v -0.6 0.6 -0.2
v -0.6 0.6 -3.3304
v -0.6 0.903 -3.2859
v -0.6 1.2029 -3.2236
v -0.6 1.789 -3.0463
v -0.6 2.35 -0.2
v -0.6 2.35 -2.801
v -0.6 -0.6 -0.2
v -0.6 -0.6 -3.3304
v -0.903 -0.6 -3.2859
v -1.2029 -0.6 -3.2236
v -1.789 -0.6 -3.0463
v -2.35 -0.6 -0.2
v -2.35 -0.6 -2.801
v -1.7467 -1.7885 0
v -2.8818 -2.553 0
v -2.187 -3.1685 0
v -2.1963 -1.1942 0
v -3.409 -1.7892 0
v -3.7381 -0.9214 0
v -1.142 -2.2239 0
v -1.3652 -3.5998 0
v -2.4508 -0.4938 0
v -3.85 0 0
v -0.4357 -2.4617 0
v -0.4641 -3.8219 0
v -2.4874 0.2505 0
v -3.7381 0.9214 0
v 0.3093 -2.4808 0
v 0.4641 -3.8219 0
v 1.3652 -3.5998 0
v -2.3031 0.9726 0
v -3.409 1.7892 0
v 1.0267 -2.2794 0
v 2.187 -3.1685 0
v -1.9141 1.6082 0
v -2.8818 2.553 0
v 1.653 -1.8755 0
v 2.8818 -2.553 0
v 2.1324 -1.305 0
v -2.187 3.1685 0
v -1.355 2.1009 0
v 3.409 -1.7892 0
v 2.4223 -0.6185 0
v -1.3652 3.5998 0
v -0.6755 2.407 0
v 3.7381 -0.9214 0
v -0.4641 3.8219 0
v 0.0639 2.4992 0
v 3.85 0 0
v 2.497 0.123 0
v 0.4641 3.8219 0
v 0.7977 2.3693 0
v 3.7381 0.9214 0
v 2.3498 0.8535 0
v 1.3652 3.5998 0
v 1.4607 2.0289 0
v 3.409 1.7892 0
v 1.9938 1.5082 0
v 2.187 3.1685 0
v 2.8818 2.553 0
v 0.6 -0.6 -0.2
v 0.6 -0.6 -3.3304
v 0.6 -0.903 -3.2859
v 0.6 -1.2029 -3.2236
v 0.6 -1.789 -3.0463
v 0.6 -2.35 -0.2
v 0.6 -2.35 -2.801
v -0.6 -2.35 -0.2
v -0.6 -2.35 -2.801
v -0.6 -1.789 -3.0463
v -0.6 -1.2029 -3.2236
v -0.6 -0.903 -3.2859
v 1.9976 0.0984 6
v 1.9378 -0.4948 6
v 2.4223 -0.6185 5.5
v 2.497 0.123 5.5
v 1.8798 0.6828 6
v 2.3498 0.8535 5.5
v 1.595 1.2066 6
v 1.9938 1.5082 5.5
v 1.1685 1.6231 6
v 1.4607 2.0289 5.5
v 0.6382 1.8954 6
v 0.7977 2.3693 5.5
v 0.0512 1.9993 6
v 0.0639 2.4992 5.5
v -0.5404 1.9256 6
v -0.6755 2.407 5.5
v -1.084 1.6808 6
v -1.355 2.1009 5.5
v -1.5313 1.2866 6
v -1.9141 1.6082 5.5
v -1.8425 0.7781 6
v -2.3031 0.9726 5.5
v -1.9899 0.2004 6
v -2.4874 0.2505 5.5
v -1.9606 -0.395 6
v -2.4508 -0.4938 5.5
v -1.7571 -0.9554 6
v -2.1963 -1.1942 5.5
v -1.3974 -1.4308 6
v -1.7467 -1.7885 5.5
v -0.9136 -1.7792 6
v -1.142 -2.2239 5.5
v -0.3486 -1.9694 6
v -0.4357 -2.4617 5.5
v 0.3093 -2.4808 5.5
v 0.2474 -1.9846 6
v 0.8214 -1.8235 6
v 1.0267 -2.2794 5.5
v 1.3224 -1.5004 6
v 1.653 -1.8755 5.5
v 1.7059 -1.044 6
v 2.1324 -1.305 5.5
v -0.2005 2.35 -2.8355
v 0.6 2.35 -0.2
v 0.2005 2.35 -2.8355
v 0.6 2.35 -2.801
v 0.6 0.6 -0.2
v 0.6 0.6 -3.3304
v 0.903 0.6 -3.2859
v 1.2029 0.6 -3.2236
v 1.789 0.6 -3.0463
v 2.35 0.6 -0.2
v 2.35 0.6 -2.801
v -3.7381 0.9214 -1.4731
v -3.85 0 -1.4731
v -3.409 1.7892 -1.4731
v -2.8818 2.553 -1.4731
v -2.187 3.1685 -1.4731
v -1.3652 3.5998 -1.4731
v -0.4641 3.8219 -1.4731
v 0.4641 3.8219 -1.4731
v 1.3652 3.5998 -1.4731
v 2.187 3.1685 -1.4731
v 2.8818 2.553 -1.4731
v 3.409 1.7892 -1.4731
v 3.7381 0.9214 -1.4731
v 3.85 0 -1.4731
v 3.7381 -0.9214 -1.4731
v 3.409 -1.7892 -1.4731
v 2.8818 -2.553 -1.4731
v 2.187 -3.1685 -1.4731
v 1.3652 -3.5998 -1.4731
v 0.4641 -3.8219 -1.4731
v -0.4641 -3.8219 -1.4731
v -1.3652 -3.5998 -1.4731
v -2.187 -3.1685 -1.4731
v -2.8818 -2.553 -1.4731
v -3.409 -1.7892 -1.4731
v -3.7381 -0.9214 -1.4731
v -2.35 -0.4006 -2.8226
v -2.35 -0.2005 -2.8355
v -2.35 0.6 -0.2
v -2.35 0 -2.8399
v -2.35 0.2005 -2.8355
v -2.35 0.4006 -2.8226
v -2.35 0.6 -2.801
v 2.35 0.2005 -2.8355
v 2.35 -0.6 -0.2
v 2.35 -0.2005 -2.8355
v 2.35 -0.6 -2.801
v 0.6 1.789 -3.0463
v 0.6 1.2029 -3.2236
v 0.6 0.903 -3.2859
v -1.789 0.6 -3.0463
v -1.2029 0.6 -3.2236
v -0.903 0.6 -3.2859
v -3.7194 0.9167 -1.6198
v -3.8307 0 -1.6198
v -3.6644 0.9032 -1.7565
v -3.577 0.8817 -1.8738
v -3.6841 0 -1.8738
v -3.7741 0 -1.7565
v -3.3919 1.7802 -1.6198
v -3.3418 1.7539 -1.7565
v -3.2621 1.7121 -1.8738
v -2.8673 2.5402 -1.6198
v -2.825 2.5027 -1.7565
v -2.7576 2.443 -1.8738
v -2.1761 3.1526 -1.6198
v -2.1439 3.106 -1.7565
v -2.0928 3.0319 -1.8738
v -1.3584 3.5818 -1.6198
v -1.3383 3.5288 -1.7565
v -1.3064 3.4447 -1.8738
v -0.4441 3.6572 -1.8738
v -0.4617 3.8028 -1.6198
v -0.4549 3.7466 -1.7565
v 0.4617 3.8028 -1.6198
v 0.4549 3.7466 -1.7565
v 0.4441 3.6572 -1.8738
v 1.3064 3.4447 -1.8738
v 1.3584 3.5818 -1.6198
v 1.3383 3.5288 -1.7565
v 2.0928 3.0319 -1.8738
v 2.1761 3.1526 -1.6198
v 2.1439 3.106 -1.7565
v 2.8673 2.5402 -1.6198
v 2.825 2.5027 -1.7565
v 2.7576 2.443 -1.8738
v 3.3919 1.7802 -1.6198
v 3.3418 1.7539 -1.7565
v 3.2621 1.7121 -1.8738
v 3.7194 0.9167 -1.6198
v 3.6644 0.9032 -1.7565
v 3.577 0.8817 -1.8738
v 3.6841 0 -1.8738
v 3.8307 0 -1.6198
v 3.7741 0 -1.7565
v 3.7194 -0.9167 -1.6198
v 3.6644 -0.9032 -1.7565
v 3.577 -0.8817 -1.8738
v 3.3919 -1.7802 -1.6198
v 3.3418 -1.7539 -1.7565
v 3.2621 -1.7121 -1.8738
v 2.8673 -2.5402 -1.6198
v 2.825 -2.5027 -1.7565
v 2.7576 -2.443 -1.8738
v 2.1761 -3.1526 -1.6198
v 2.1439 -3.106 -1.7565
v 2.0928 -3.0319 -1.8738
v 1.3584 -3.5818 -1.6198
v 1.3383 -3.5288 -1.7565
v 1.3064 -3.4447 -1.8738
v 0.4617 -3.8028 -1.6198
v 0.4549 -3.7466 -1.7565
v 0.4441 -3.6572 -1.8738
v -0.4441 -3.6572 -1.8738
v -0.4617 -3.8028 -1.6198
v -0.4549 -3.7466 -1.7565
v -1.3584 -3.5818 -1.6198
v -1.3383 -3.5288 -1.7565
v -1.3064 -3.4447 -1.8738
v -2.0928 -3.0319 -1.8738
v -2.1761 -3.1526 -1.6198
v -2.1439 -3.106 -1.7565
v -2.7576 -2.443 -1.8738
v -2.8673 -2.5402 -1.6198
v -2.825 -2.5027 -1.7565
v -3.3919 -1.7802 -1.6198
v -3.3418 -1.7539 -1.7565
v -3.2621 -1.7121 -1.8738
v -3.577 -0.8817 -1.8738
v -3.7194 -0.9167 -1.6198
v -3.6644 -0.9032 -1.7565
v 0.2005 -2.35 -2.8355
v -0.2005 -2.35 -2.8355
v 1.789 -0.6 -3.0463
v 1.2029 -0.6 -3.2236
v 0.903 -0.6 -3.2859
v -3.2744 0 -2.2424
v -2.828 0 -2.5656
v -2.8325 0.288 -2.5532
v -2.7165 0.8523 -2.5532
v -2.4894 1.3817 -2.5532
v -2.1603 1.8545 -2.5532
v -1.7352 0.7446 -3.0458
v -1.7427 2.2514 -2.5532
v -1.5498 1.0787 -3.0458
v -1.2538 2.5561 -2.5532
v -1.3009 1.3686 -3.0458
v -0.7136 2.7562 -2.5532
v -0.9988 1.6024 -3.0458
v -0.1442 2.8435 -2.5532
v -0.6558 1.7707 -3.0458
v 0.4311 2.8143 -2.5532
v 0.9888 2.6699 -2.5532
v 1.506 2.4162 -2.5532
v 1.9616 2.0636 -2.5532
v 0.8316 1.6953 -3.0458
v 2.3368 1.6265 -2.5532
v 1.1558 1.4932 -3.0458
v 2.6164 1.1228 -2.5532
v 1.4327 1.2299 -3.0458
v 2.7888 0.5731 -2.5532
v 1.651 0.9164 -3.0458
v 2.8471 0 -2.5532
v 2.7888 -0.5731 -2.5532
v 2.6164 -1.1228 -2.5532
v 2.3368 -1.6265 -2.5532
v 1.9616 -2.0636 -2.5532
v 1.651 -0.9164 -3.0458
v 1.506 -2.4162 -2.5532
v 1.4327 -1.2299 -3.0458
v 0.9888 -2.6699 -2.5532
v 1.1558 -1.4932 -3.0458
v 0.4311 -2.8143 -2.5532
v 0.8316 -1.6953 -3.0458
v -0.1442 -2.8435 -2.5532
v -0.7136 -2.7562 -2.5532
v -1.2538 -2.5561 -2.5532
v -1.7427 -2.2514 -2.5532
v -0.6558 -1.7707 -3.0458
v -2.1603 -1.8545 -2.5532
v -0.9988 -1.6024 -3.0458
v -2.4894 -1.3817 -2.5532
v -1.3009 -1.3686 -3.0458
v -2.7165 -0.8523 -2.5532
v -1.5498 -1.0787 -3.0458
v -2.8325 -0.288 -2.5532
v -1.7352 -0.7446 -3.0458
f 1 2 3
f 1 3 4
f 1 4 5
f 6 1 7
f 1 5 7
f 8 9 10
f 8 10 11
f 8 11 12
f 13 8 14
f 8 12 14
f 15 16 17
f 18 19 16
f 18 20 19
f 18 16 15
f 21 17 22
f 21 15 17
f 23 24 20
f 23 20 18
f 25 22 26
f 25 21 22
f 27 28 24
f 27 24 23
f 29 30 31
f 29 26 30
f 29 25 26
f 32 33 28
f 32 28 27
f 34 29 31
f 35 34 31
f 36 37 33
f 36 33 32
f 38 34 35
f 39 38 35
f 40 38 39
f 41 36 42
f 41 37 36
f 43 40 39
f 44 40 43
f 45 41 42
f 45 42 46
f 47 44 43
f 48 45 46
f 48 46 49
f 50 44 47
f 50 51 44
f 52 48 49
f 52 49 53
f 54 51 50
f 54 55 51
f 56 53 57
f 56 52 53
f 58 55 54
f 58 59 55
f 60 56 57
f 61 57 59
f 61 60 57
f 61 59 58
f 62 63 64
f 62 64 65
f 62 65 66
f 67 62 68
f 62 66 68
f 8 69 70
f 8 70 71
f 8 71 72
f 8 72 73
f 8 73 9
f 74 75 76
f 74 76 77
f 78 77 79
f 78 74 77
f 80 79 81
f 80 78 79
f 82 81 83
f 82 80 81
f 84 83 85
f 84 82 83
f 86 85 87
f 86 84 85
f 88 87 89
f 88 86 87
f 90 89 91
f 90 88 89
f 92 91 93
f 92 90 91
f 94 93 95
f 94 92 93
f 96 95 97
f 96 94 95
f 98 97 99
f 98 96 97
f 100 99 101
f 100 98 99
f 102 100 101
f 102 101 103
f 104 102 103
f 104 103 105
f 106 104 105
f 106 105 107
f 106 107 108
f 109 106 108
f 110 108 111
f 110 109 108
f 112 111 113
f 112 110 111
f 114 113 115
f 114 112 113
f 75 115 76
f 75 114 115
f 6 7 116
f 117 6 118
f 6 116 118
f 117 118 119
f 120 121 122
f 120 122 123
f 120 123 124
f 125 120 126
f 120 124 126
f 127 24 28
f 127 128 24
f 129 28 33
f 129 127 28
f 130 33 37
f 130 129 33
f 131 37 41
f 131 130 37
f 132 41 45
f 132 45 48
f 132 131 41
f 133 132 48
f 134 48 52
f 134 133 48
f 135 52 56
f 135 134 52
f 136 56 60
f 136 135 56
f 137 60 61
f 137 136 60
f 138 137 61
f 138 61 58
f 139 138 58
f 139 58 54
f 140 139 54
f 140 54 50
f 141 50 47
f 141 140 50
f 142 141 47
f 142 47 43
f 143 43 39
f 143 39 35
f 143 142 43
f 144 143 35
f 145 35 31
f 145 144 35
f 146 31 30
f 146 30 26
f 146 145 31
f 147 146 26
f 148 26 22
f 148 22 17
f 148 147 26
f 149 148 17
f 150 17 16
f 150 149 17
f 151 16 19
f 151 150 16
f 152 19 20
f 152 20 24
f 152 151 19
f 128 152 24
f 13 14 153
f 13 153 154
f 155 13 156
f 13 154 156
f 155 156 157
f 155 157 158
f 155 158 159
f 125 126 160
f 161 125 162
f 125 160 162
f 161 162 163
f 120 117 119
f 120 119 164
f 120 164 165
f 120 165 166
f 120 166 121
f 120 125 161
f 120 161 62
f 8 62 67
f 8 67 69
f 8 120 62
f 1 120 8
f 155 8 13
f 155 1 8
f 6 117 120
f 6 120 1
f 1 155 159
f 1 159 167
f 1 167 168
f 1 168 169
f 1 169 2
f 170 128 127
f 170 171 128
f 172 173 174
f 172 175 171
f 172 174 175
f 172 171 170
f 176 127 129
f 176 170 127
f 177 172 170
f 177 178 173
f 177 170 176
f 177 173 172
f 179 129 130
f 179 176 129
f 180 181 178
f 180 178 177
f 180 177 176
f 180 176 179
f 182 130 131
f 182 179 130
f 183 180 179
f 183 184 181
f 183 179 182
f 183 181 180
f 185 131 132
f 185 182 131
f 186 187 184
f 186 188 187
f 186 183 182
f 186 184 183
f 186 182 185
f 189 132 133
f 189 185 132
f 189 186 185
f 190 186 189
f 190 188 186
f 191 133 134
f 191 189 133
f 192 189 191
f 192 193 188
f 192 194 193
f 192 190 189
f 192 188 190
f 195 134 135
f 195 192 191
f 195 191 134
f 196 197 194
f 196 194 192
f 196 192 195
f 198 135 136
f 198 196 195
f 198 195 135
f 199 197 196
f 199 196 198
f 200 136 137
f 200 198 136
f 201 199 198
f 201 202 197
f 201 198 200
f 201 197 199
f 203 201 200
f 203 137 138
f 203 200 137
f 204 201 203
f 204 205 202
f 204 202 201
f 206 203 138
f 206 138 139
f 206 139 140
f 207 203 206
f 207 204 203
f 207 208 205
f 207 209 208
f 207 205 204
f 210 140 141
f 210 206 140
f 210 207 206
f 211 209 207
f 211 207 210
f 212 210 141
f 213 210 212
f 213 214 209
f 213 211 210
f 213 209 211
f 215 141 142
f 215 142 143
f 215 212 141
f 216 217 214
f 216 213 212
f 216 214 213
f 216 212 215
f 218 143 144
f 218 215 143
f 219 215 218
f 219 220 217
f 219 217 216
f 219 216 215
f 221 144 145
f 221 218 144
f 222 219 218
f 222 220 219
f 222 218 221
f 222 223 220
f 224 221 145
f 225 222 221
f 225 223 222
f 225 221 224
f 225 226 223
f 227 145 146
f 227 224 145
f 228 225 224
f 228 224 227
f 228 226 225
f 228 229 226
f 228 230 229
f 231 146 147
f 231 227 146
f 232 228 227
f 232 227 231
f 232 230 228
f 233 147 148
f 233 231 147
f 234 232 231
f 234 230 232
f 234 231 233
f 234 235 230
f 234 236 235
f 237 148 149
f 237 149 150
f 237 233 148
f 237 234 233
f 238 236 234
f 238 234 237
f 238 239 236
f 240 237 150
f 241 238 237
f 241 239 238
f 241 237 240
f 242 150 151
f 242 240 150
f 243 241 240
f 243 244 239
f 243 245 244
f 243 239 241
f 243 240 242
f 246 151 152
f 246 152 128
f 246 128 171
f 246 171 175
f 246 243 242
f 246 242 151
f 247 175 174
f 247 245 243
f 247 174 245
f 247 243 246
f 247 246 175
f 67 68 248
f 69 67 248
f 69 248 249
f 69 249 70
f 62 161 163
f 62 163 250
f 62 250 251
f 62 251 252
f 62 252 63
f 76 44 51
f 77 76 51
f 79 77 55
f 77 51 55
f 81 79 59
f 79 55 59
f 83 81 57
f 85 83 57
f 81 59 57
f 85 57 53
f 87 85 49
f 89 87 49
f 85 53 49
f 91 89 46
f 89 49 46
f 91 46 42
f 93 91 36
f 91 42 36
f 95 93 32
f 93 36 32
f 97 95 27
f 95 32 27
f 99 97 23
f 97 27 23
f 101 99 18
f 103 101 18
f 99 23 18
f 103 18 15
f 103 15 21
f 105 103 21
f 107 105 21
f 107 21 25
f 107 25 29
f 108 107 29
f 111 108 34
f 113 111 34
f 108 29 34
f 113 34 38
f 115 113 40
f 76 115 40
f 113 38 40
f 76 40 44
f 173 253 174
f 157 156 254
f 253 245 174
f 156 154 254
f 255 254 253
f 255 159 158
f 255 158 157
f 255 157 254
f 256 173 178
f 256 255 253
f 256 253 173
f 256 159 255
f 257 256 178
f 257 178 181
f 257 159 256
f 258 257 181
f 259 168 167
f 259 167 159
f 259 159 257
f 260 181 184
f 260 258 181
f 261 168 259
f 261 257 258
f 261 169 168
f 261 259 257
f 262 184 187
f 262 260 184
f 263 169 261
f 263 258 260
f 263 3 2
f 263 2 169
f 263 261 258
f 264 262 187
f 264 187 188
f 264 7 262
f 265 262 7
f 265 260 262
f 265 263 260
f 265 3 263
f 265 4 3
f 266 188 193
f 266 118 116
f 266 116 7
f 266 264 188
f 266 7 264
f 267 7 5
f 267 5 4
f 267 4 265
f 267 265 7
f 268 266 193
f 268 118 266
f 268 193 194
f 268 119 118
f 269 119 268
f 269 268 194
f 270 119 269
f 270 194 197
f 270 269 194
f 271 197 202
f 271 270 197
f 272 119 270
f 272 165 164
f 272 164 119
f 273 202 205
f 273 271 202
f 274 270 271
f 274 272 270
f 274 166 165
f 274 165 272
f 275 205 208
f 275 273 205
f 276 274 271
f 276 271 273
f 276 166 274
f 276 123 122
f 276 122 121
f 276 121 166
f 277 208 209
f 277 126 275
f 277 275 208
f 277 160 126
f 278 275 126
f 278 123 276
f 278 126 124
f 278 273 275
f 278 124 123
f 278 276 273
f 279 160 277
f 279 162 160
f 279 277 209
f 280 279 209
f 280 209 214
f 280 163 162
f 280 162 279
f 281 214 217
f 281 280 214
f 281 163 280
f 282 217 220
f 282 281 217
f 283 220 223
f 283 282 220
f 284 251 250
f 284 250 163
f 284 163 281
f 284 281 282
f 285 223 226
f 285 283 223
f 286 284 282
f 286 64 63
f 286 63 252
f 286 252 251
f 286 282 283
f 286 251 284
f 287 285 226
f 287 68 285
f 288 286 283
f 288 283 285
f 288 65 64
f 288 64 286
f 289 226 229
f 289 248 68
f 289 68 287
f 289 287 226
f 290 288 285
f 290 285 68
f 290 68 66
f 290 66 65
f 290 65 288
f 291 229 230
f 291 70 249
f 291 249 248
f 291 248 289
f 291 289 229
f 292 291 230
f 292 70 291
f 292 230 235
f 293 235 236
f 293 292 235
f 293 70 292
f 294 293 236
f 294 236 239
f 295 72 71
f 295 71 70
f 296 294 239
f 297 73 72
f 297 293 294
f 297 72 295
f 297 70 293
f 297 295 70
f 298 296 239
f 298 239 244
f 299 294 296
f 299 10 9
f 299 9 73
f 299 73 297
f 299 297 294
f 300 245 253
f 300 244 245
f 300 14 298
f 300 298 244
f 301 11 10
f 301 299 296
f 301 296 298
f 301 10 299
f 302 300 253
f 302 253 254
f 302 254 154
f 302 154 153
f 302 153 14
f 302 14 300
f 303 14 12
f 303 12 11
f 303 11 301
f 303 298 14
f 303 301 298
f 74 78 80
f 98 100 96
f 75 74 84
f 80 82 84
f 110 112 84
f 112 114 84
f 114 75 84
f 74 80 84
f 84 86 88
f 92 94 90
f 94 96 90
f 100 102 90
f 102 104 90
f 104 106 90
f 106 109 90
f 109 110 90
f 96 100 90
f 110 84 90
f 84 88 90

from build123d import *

# Parameters (mm, degrees)
ENLEV_MAT_EXTRU_1_DEPTH = 1.2
ESQUISSE3_W             = 2.5
ESQUISSE3_H             = 6
CHANFREIN1_SIZE         = 0.5
ENL_V_MAT_EXTRU_1_DEPTH = 2


with BuildPart() as part:
    # Esquisse1 → Base-Révolution (revolve)
    with BuildSketch(Plane(origin=(0, 0, 0), x_dir=(1, 0, 0), z_dir=(0, 1, 0))):
        with BuildLine():
            Line((0, 0), (3.85, 0))
            Line((3.85, 0), (3.85, 1.47314887))
            ThreePointArc((3.85, 1.47314887), (3.806875399, 1.689977873), (3.684065354, 1.873804531))
            ThreePointArc((3.684065354, 1.873804531), (1.993841151, 3.003350962), (0, 3.4))
            Line((0, 3.4), (0, 0))
        make_face()
    revolve(axis=Axis((0, 0, 0), (0, 0, -1)))

    # Esquisse2 → Enlev. mat.-Extru.1 (cut)
    with BuildSketch(Plane.XY.offset(-3.4)):
        Polygon((0.6, -0.6), (0.6, -2.35), (-0.6, -2.35), (-0.6, -0.6), (-2.35, -0.6), (-2.35, 0.6), (-0.6, 0.6), (-0.6, 2.35), (0.6, 2.35), (0.6, 0.6), (2.35, 0.6), (2.35, -0.6), align=None)
    extrude(amount=ENLEV_MAT_EXTRU_1_DEPTH, mode=Mode.SUBTRACT)

    # Esquisse3 → Boss.-Révol.1 (revolve)
    with BuildSketch(Plane(origin=(0, 0, 0), x_dir=(1, 0, 0), z_dir=(0, 1, 0))):
        with Locations((1.25, -3)):
            Rectangle(ESQUISSE3_W, ESQUISSE3_H)
    revolve(axis=Axis((0, 0, 0), (0, 0, 1)))

    # Chanfrein1
    chanfrein1_edges = [part.edges().sort_by_distance(p)[0] for p in [
        (-2.5, 0, 6),
    ]]
    chamfer(chanfrein1_edges, length=CHANFREIN1_SIZE)

    # Esquisse6 → Enlèv. mat.-Extru.1 (cut)
    with BuildSketch(Plane(origin=(0, 0, -2.2), x_dir=(-1, 0, 0), z_dir=(0, 0, -1))):
        Polygon((2.35, -0.6), (2.35, 0.6), (0.6, 0.6), (0.6, 2.35), (-0.6, 2.35), (-0.6, 0.6), (-2.35, 0.6), (-2.35, -0.6), (-0.6, -0.6), (-0.6, -2.35), (0.6, -2.35), (0.6, -0.6), align=None)
    extrude(amount=-ENL_V_MAT_EXTRU_1_DEPTH, mode=Mode.SUBTRACT)


solid = part.part
